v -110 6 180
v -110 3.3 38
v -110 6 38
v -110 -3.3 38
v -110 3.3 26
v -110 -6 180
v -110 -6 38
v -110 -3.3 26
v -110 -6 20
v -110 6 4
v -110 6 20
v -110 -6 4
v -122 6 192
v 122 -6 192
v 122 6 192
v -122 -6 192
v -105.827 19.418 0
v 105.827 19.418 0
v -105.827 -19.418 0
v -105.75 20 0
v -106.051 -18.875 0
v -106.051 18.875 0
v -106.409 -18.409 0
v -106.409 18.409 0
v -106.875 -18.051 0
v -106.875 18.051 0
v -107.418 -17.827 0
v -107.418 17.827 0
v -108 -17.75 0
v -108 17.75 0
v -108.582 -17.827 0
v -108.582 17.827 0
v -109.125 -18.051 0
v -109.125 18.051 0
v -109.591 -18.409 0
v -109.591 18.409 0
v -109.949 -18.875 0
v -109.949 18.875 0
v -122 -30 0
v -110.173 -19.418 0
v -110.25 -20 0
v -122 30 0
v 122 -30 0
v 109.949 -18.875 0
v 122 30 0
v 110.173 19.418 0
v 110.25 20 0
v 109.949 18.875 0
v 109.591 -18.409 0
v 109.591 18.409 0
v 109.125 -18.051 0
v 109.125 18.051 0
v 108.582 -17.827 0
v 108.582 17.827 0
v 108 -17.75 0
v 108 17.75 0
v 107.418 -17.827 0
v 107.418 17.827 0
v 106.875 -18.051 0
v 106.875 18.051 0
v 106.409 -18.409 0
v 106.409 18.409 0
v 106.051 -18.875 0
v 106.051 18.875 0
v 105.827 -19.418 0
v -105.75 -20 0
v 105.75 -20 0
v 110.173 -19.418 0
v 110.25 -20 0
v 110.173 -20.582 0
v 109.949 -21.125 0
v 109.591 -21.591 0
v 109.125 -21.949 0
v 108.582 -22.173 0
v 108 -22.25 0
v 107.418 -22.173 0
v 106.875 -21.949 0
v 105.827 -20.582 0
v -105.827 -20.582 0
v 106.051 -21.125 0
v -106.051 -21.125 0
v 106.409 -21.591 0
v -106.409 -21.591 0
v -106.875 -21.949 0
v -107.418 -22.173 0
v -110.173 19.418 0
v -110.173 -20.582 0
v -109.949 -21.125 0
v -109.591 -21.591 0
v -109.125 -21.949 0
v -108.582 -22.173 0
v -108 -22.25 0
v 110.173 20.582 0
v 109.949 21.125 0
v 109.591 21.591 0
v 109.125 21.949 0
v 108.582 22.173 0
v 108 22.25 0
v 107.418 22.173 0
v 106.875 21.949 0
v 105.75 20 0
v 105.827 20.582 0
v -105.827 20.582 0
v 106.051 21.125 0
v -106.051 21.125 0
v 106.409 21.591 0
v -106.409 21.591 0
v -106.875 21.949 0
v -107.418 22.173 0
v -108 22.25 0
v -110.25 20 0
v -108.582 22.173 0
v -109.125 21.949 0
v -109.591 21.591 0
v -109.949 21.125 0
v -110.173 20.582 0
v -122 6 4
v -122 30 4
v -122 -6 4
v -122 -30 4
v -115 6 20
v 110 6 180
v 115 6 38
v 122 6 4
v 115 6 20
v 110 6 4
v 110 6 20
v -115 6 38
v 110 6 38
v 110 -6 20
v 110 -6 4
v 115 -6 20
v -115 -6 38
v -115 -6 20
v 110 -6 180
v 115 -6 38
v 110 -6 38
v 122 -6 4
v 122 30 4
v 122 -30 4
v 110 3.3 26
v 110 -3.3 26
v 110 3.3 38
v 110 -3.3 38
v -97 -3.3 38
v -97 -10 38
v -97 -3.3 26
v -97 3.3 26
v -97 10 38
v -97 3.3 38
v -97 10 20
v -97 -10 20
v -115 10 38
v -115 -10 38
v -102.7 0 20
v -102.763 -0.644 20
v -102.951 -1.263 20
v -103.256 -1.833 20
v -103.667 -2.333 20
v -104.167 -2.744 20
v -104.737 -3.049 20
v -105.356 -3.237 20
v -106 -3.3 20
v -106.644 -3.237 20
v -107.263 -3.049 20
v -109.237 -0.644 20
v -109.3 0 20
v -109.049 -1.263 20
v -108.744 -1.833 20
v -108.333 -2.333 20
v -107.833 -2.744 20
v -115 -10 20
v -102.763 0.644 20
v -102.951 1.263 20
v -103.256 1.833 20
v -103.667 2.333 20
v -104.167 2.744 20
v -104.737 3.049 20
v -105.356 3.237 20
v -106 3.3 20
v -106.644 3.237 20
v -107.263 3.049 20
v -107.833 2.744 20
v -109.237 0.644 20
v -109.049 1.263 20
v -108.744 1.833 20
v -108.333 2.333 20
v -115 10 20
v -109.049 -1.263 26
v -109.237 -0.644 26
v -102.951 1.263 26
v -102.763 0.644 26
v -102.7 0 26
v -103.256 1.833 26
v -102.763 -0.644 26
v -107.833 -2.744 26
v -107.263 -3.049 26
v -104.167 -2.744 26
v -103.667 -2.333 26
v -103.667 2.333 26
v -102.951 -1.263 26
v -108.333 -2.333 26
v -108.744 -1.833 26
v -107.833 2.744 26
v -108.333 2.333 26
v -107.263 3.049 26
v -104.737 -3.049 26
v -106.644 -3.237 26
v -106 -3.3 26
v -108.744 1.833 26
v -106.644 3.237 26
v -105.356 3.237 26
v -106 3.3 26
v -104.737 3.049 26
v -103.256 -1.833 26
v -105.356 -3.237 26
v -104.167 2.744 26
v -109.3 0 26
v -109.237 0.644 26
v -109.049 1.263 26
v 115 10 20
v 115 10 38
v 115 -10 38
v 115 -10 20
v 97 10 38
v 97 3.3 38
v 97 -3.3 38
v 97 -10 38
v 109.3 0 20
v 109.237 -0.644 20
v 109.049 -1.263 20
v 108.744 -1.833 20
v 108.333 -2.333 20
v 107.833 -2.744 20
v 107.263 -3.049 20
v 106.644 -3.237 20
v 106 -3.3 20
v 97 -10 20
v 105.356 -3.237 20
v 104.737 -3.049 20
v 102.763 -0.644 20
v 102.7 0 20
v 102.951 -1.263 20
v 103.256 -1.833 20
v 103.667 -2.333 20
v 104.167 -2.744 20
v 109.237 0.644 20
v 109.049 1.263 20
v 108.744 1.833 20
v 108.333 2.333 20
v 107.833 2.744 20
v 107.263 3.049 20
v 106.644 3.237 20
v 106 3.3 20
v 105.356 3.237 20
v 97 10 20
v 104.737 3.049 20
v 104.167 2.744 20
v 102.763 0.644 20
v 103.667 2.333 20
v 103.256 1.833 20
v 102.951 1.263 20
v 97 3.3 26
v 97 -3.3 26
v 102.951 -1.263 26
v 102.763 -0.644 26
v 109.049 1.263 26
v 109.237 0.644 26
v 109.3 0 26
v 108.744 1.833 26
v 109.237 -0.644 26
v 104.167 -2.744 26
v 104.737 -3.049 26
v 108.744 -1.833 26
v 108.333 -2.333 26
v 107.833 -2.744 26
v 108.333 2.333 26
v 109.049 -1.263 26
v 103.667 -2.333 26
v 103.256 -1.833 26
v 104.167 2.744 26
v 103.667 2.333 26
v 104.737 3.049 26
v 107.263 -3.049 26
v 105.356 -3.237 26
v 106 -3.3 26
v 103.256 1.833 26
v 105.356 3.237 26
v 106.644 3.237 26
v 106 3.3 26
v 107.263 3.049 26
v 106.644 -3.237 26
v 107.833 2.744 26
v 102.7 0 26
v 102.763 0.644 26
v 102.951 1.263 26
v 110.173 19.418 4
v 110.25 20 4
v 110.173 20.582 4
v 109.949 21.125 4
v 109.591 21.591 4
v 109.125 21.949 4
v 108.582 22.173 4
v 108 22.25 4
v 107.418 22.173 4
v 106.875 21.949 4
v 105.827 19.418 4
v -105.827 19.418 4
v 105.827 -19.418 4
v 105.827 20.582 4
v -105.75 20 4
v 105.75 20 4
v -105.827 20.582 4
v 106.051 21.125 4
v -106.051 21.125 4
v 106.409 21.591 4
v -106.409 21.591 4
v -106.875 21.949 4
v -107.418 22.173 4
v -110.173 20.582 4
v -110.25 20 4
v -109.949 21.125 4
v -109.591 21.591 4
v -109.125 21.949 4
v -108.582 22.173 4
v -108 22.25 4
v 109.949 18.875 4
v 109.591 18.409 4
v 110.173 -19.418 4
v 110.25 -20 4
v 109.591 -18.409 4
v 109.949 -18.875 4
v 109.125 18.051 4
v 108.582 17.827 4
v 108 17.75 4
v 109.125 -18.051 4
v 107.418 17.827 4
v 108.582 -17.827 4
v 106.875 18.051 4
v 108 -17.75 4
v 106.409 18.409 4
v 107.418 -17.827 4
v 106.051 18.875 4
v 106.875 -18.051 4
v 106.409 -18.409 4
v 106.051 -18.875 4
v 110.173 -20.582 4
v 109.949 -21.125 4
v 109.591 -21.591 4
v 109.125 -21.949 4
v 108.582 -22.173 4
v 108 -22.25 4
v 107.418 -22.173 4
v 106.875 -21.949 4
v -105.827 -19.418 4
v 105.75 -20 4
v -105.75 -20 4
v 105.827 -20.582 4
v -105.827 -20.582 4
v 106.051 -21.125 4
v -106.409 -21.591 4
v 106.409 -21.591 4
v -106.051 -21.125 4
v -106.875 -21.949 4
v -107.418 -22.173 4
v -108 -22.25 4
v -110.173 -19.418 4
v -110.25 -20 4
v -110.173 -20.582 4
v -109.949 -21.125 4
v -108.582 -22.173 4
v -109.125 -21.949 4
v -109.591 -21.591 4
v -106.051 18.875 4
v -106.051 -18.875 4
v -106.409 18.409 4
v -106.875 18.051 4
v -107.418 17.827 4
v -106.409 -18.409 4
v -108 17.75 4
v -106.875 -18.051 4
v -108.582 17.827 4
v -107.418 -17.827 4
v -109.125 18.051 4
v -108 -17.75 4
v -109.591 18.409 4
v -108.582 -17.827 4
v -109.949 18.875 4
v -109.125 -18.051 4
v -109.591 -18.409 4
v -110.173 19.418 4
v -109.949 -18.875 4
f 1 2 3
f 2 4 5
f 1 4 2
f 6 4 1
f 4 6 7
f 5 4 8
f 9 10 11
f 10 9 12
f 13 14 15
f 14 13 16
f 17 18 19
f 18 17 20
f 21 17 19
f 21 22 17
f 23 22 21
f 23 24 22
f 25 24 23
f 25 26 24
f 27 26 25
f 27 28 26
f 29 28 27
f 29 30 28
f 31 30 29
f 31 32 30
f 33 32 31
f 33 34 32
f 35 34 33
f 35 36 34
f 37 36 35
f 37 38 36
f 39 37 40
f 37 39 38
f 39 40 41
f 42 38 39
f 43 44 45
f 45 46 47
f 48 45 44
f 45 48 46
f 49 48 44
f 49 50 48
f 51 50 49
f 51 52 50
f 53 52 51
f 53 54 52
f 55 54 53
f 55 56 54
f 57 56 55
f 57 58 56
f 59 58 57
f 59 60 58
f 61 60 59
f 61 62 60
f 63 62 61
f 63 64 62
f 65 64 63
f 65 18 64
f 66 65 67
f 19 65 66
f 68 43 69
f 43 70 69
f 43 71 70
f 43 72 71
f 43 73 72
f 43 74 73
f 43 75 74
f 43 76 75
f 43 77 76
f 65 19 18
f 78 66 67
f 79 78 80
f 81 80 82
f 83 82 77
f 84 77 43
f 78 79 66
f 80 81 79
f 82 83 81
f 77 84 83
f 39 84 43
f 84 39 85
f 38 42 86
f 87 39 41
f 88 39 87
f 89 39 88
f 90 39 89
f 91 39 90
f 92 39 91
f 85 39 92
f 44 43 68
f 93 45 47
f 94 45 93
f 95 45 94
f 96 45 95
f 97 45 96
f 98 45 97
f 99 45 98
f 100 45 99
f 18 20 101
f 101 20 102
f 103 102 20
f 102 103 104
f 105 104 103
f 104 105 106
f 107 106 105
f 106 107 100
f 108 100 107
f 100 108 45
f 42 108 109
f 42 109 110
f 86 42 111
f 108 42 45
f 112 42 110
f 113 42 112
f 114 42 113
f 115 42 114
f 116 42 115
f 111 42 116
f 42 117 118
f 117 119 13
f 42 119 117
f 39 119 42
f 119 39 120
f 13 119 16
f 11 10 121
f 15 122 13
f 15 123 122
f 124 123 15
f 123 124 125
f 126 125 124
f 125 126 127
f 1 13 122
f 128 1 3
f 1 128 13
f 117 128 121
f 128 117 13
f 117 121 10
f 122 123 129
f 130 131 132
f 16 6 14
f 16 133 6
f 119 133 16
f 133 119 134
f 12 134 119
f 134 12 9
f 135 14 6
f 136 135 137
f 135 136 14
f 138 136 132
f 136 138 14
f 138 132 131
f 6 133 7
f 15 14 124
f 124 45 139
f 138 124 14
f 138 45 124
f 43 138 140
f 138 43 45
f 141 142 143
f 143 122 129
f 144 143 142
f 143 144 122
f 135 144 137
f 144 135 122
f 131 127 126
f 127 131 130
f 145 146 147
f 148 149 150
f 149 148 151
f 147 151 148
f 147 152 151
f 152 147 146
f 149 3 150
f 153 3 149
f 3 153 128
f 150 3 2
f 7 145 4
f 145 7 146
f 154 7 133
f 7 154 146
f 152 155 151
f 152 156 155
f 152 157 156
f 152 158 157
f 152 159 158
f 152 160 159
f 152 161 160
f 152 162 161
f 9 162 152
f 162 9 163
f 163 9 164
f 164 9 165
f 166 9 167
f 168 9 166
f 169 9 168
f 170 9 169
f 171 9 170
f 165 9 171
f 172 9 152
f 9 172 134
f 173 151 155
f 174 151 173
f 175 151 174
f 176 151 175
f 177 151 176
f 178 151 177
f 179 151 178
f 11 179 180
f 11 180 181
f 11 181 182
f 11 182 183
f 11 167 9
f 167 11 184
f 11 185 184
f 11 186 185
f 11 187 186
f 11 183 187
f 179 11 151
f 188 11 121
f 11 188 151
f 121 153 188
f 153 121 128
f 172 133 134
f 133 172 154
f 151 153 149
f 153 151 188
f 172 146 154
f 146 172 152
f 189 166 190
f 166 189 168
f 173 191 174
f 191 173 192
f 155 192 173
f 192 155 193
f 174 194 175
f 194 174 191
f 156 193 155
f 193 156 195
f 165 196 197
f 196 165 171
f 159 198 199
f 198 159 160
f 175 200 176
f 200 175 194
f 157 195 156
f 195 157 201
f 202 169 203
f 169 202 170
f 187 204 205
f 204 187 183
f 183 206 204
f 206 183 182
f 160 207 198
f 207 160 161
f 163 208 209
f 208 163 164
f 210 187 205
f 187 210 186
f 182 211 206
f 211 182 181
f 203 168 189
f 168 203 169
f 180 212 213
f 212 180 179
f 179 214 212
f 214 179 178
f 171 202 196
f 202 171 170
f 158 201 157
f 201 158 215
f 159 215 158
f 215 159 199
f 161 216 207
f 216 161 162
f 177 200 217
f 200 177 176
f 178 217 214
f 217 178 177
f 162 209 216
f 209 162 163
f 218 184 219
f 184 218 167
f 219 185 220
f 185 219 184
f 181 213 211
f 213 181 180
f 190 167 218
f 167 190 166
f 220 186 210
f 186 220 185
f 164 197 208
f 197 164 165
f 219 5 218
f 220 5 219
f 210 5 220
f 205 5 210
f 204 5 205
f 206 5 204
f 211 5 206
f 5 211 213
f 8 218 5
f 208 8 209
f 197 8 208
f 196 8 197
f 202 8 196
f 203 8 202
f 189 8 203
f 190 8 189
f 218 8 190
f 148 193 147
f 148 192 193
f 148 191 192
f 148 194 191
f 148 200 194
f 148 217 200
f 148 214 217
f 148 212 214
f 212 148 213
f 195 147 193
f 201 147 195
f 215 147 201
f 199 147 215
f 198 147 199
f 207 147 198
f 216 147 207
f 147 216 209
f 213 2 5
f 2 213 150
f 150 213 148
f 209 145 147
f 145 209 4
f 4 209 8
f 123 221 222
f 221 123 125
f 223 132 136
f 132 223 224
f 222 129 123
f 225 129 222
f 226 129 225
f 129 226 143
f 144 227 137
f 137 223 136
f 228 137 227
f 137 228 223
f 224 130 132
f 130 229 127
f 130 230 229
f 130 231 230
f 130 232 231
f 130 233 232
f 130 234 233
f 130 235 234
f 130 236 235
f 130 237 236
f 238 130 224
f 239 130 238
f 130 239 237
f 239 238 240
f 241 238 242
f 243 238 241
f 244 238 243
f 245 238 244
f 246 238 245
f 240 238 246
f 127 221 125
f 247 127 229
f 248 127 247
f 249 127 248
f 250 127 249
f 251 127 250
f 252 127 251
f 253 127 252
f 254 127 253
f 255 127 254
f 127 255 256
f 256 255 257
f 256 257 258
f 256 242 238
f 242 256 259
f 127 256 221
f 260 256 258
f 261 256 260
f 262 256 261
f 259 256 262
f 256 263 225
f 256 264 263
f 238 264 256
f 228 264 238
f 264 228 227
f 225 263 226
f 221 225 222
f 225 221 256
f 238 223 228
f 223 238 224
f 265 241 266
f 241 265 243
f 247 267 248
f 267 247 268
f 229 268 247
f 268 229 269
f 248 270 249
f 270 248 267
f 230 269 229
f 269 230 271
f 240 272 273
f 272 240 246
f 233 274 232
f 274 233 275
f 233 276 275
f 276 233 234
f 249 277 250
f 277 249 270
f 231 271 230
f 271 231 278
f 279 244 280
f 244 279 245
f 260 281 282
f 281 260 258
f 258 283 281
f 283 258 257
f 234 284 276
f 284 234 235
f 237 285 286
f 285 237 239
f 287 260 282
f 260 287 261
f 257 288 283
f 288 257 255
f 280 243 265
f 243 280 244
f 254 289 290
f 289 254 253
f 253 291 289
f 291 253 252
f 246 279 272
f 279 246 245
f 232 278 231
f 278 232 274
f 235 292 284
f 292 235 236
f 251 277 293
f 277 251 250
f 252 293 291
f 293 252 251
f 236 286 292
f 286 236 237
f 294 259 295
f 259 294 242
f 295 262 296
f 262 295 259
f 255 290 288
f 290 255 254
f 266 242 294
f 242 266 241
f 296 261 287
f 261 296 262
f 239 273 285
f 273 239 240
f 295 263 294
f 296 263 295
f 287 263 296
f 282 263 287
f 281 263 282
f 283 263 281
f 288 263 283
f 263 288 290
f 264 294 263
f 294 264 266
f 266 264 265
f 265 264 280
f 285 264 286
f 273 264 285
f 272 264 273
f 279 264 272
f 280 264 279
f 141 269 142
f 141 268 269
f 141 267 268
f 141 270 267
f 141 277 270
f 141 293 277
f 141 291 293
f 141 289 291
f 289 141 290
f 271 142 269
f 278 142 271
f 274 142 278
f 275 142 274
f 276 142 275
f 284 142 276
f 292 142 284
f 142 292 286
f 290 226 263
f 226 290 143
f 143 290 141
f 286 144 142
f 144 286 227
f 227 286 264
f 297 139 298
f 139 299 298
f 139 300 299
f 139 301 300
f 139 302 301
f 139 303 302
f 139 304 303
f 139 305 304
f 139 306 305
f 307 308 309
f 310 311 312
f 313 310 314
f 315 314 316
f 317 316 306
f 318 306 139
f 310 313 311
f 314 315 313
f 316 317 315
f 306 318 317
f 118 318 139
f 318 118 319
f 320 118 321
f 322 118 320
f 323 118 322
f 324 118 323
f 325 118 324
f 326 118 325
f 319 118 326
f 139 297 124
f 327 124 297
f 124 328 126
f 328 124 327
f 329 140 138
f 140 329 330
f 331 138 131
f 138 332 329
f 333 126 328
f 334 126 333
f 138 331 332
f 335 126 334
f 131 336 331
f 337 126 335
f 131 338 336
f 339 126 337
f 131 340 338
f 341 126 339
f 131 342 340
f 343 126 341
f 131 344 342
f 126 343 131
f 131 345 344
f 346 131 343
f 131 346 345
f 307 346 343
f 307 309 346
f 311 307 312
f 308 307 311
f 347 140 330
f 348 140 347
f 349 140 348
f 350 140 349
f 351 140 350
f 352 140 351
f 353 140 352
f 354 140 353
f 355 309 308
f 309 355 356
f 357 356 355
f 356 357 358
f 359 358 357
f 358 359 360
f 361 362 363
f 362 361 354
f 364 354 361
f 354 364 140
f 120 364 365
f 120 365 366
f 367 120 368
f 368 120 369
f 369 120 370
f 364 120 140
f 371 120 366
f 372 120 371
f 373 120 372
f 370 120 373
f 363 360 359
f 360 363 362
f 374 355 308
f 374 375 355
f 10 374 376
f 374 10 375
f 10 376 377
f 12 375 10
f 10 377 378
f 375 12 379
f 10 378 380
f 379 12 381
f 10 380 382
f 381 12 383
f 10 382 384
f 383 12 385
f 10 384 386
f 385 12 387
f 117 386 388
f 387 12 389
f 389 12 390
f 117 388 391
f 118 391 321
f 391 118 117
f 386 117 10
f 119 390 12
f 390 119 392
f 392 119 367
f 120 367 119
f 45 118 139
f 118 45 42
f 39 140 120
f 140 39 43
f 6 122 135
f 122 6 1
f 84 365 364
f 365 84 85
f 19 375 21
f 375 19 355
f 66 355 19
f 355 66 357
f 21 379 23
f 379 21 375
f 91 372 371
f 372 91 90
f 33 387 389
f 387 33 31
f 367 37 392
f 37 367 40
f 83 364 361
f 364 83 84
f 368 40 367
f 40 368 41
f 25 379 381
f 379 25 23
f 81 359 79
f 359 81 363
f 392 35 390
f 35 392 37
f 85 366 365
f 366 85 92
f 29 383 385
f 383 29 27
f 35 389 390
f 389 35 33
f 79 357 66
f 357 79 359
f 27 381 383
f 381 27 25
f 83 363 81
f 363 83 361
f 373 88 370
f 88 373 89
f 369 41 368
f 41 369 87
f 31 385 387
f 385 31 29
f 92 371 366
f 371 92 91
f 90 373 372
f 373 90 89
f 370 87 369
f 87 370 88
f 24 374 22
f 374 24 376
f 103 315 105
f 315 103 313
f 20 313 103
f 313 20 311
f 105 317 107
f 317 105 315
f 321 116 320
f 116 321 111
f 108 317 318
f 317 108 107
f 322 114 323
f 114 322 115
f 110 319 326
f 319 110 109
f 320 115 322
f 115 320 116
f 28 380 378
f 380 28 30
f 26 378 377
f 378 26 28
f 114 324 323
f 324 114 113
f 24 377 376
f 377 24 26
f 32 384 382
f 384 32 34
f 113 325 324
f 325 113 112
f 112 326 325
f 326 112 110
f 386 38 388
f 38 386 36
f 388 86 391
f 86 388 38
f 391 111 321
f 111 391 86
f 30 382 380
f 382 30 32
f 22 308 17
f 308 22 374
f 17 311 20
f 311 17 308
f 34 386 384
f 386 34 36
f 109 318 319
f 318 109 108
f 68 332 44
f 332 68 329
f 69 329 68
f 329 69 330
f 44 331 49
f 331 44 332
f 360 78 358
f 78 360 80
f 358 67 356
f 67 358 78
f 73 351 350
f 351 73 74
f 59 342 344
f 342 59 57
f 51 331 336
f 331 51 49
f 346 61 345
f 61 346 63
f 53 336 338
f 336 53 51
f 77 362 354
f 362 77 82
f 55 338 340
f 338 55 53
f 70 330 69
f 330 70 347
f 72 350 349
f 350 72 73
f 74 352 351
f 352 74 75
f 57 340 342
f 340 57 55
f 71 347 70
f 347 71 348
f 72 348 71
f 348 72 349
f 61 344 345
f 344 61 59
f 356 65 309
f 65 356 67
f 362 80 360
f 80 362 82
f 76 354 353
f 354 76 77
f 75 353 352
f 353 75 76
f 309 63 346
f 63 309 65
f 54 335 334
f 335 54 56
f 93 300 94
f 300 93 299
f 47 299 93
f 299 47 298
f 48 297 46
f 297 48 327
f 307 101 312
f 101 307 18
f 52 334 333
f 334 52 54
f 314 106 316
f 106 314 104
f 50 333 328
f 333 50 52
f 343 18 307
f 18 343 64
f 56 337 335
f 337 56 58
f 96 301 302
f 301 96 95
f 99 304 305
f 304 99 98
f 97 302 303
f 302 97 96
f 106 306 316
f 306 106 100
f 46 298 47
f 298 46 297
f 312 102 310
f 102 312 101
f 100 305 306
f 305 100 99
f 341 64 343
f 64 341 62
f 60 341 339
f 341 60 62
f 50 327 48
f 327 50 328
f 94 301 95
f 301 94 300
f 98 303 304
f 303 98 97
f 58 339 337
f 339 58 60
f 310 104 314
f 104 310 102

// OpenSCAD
clear_width=220; clear_height=180; frame_bar=12; base_depth=60; mount_hole_diameter=4.5; hinge_bore=6.6;
module hinge_saddle(x,z){ difference(){ translate([x-9,-10,z-6]) cube([18,20,18]); translate([x,0,z]) cylinder(d=hinge_bore,h=22,center=true,$fn=32); translate([x-12,-hinge_bore/2,z]) cube([24,hinge_bore,18]); }}
module saloon_frame(){ difference(){ union(){ translate([-(clear_width+2*frame_bar)/2,-base_depth/2,0]) cube([clear_width+2*frame_bar,base_depth,4]); for(x=[-clear_width/2-frame_bar,clear_width/2]) translate([x,-frame_bar/2,0]) cube([frame_bar,frame_bar,clear_height+frame_bar]); translate([-clear_width/2-frame_bar,-frame_bar/2,clear_height]) cube([clear_width+2*frame_bar,frame_bar,frame_bar]); hinge_saddle(-clear_width/2+4,26); hinge_saddle(clear_width/2-4,26); } for(x=[-108,108],y=[-20,20]) translate([x,y,-1]) cylinder(d=mount_hole_diameter,h=7,$fn=24); }}
assert(clear_width==220 && clear_height==180 && hinge_bore==6.6); echo("SCADCTL_REQUIREMENT:parameters:PASS"); saloon_frame();
